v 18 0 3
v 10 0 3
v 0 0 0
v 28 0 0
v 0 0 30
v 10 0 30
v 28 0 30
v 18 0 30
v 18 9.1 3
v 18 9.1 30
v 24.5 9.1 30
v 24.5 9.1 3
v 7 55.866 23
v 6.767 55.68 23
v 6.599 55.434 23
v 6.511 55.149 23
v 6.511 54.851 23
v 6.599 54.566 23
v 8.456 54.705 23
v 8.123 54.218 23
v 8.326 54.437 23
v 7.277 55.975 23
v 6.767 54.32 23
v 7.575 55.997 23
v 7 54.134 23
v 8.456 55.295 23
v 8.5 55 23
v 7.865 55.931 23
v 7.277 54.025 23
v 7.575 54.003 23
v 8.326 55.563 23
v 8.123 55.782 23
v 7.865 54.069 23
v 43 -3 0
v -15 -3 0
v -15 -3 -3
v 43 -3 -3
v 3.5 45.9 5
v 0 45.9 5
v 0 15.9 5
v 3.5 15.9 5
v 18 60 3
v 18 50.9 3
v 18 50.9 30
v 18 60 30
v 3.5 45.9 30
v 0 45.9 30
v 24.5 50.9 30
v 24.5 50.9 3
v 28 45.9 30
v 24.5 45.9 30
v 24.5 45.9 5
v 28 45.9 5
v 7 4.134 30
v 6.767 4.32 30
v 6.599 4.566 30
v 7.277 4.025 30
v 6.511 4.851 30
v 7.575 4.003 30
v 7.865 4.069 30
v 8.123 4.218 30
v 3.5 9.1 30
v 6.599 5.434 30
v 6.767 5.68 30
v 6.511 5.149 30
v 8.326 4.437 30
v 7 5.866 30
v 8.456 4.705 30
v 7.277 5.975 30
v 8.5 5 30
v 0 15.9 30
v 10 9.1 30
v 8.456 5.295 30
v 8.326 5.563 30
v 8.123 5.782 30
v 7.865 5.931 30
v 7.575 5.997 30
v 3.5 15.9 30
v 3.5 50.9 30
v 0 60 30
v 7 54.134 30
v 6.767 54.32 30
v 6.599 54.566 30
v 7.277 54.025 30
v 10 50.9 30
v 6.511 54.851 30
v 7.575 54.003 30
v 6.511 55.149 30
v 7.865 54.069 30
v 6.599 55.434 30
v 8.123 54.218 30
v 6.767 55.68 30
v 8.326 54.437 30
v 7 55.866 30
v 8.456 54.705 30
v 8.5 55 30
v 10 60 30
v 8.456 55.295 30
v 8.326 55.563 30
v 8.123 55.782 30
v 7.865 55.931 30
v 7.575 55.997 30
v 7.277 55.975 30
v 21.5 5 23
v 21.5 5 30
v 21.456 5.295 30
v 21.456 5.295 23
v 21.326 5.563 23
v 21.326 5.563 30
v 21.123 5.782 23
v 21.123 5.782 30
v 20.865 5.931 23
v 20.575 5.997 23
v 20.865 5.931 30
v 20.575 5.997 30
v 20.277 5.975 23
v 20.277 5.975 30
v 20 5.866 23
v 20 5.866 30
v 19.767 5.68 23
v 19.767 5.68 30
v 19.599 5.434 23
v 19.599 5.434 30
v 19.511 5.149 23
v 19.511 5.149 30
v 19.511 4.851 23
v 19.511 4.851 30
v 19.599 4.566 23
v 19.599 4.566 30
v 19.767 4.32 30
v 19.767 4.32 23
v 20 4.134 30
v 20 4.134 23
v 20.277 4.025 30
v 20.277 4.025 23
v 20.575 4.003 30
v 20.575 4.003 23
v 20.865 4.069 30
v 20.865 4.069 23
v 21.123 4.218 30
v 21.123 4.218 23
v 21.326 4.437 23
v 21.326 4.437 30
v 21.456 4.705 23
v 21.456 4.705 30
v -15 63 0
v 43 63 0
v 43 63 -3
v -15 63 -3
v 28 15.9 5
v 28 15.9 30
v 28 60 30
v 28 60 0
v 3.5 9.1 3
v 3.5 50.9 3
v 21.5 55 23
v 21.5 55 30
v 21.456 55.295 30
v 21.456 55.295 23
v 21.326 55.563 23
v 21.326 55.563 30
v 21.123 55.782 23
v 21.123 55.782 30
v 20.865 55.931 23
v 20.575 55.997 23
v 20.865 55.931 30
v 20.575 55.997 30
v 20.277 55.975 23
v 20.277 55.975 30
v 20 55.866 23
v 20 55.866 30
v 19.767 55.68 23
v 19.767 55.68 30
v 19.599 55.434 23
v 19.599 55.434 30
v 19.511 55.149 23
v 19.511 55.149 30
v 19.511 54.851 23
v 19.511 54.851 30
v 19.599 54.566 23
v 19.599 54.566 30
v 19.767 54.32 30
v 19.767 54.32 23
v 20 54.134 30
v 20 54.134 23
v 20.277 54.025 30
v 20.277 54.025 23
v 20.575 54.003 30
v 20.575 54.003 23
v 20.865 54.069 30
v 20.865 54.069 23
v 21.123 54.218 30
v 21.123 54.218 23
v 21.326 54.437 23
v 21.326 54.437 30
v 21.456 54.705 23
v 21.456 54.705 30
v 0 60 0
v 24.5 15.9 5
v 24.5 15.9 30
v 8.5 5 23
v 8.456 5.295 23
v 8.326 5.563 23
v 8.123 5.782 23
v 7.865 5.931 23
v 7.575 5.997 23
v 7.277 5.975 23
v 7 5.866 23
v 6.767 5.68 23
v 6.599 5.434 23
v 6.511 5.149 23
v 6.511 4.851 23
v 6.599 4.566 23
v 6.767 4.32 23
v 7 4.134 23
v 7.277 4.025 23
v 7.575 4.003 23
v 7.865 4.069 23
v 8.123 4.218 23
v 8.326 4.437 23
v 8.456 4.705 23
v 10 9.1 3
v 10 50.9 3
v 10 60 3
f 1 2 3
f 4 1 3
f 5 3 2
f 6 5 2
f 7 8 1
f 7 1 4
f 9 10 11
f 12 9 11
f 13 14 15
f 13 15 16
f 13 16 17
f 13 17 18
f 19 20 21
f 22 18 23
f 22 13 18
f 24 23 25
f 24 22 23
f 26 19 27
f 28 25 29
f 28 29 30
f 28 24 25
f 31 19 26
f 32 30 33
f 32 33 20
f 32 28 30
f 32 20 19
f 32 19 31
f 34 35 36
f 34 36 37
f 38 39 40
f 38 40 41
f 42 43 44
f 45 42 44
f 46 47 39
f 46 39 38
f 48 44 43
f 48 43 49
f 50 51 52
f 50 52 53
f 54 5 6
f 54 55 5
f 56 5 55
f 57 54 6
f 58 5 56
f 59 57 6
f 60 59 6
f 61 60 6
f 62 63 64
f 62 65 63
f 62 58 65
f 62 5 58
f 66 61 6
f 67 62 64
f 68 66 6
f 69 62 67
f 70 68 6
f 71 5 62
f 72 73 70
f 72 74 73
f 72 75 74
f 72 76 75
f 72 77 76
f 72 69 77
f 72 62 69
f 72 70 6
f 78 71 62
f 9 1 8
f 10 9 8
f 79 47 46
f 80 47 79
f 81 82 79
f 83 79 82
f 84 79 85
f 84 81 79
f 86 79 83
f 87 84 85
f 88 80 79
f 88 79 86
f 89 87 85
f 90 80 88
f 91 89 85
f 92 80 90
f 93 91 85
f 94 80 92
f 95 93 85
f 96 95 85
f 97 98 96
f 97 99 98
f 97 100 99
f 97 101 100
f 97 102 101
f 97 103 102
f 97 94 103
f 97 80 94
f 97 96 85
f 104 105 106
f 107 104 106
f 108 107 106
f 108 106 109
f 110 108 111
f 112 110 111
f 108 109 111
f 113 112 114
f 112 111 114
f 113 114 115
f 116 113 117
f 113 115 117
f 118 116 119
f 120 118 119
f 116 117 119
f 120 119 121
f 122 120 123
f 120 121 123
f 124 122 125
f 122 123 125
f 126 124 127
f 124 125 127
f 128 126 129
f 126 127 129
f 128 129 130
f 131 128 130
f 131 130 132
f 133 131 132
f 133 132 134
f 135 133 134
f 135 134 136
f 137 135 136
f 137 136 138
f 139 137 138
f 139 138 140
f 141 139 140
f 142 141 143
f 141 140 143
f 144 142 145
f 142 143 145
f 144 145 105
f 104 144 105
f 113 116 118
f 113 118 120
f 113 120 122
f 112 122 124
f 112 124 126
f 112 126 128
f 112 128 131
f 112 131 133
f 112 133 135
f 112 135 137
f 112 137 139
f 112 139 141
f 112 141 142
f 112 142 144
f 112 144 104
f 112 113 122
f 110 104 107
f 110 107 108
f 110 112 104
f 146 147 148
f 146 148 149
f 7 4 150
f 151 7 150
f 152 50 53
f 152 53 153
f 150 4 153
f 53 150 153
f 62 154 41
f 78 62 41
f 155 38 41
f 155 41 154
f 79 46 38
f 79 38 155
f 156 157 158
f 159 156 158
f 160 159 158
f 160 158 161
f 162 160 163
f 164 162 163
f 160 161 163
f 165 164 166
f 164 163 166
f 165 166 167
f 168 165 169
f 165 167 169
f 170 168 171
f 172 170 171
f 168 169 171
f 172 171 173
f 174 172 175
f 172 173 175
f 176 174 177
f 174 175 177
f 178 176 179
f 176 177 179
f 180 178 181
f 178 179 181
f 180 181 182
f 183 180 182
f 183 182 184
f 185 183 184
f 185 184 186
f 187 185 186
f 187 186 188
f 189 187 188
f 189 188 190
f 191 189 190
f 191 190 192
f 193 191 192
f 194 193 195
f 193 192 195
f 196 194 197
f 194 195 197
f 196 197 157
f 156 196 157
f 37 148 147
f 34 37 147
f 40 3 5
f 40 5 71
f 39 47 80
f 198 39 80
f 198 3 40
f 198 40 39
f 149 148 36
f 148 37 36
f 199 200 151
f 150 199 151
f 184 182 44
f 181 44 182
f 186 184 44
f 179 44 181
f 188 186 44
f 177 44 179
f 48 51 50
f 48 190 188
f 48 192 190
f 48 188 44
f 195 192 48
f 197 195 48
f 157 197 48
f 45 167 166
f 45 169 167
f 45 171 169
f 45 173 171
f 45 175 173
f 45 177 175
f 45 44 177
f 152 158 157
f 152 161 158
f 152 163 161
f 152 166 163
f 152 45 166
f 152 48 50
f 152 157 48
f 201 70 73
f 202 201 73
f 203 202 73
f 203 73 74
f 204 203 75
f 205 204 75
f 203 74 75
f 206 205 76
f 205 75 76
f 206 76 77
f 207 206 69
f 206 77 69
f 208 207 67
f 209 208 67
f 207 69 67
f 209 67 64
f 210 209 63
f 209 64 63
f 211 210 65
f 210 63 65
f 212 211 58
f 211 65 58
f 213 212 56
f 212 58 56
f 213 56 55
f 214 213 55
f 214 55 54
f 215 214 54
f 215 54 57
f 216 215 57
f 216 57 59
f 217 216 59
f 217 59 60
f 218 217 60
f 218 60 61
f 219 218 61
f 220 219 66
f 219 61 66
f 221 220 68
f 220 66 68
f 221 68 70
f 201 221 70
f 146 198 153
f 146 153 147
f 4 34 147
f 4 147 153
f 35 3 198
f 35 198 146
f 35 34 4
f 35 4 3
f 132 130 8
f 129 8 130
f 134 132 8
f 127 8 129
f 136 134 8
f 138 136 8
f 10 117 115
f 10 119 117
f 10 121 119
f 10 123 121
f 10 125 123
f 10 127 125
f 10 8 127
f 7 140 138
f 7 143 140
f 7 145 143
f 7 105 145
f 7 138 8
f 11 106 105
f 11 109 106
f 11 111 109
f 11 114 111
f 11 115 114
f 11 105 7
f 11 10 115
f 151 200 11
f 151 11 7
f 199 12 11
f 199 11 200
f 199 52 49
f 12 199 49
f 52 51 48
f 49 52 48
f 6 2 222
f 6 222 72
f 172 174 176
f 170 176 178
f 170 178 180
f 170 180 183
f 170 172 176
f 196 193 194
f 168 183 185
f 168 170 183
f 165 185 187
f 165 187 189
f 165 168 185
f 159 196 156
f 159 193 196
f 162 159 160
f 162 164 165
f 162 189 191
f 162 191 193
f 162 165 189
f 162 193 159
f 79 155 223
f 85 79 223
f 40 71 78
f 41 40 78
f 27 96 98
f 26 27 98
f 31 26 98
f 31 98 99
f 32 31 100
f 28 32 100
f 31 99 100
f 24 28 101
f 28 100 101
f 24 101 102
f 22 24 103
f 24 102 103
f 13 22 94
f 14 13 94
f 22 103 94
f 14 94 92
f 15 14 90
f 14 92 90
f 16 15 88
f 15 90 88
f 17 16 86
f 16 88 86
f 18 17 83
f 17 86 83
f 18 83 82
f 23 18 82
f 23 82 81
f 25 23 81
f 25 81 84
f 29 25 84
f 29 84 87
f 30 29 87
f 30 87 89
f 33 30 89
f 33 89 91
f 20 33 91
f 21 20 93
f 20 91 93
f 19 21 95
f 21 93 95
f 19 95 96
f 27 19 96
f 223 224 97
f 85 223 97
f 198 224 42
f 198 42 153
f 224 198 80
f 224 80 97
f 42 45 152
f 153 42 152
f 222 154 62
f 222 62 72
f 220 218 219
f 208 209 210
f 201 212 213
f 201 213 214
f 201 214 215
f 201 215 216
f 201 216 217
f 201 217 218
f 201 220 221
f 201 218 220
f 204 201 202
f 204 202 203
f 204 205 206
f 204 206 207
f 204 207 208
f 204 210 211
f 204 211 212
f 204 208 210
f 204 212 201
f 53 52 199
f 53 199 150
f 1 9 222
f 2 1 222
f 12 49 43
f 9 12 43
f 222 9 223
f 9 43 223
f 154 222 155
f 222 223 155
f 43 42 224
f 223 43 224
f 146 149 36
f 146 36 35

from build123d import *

# Parameters (mm, degrees)
SKETCH_W        = 28
SKETCH_H        = 60
PAD_DEPTH       = 30
SKETCH001_W     = 21
SKETCH001_H     = 41.8
POCKET_DEPTH    = 27
SKETCH002_W     = 3.5
SKETCH002_H     = 30
POCKET001_DEPTH = 25
SKETCH003_W     = 3.5
SKETCH003_H     = 30
POCKET002_DEPTH = 25
SKETCH006_W     = 8
SKETCH006_H     = 7
POCKET005_DEPTH = 60.001
SKETCH007_R     = 1
POCKET006_DEPTH = 7
SKETCH008_R     = 1
POCKET007_DEPTH = 7
SKETCH009_W     = 8
SKETCH009_H     = 20
POCKET008_DEPTH = 60.001
SKETCH010_W     = 58
SKETCH010_H     = 60
PAD001_DEPTH    = 3
SKETCH011_W     = 58
SKETCH011_H     = 3
PAD002_DEPTH    = 3
SKETCH012_W     = 58
SKETCH012_H     = 3
PAD003_DEPTH    = 3


with BuildPart() as part:
    # Sketch → Pad (new body)
    with BuildSketch(Plane.XY):
        with Locations((14, 30)):
            Rectangle(SKETCH_W, SKETCH_H)
    extrude(amount=PAD_DEPTH)

    # Sketch001 (on Face6 of Pad) → Pocket (cut)
    with BuildSketch(Plane.XY.offset(30)):
        with Locations((14, 30)):
            Rectangle(SKETCH001_W, SKETCH001_H)
    extrude(amount=-POCKET_DEPTH, mode=Mode.SUBTRACT)

    # Sketch002 (on Face5 of Pocket) → Pocket001 (cut)
    with BuildSketch(Plane.XY.offset(30)):
        with Locations((1.75, 30.9)):
            Rectangle(SKETCH002_W, SKETCH002_H)
    extrude(amount=-POCKET001_DEPTH, mode=Mode.SUBTRACT)

    # Sketch003 (on Face5 of Pocket) → Pocket002 (cut)
    with BuildSketch(Plane.XY.offset(30)):
        with Locations((26.25, 30.9)):
            Rectangle(SKETCH003_W, SKETCH003_H)
    extrude(amount=-POCKET002_DEPTH, mode=Mode.SUBTRACT)

    # Sketch006 → Pocket005 (cut, through all)
    with BuildSketch(Plane(origin=(0, 60, 0), x_dir=(-1, 0, 0), z_dir=(0, 1, 0))):
        with Locations((-14, 6.5)):
            Rectangle(SKETCH006_W, SKETCH006_H)
    extrude(amount=-POCKET005_DEPTH, mode=Mode.SUBTRACT)

    # Sketch007 (on Face4 of Pocket005) → Pocket006 (cut)
    with BuildSketch(Plane.XY.offset(30)):
        with Locations((7.5, 5)):
            Circle(SKETCH007_R)
        with Locations((20.5, 5)):
            Circle(SKETCH007_R)
    extrude(amount=-POCKET006_DEPTH, mode=Mode.SUBTRACT)

    # Sketch008 (on Face13 of Pocket005) → Pocket007 (cut)
    with BuildSketch(Plane.XY.offset(30)):
        with Locations((7.5, 55)):
            Circle(SKETCH008_R)
        with Locations((20.5, 55)):
            Circle(SKETCH008_R)
    extrude(amount=-POCKET007_DEPTH, mode=Mode.SUBTRACT)

    # Sketch009 (on Face1 of Pocket007) → Pocket008 (cut, through all)
    with BuildSketch(Plane.XZ):
        with Locations((14, 20)):
            Rectangle(SKETCH009_W, SKETCH009_H)
    extrude(amount=-POCKET008_DEPTH, mode=Mode.SUBTRACT)

    # Sketch010 (on Face2 of Pocket008) → Pad001 (join)
    with BuildSketch(Plane(origin=(0, 0, 0), x_dir=(1, 0, 0), z_dir=(0, 0, -1))):
        with Locations((14, -30)):
            Rectangle(SKETCH010_W, SKETCH010_H)
    extrude(amount=PAD001_DEPTH)

    # Sketch011 (on Face1 of Pad001) → Pad002 (join)
    with BuildSketch(Plane.XZ):
        with Locations((14, -1.5)):
            Rectangle(SKETCH011_W, SKETCH011_H)
    extrude(amount=PAD002_DEPTH)

    # Sketch012 (on Face8 of Pad001) → Pad003 (join)
    with BuildSketch(Plane(origin=(0, 60, 0), x_dir=(-1, 0, 0), z_dir=(0, 1, 0))):
        with Locations((-14, -1.5)):
            Rectangle(SKETCH012_W, SKETCH012_H)
    extrude(amount=PAD003_DEPTH)


solid = part.part
